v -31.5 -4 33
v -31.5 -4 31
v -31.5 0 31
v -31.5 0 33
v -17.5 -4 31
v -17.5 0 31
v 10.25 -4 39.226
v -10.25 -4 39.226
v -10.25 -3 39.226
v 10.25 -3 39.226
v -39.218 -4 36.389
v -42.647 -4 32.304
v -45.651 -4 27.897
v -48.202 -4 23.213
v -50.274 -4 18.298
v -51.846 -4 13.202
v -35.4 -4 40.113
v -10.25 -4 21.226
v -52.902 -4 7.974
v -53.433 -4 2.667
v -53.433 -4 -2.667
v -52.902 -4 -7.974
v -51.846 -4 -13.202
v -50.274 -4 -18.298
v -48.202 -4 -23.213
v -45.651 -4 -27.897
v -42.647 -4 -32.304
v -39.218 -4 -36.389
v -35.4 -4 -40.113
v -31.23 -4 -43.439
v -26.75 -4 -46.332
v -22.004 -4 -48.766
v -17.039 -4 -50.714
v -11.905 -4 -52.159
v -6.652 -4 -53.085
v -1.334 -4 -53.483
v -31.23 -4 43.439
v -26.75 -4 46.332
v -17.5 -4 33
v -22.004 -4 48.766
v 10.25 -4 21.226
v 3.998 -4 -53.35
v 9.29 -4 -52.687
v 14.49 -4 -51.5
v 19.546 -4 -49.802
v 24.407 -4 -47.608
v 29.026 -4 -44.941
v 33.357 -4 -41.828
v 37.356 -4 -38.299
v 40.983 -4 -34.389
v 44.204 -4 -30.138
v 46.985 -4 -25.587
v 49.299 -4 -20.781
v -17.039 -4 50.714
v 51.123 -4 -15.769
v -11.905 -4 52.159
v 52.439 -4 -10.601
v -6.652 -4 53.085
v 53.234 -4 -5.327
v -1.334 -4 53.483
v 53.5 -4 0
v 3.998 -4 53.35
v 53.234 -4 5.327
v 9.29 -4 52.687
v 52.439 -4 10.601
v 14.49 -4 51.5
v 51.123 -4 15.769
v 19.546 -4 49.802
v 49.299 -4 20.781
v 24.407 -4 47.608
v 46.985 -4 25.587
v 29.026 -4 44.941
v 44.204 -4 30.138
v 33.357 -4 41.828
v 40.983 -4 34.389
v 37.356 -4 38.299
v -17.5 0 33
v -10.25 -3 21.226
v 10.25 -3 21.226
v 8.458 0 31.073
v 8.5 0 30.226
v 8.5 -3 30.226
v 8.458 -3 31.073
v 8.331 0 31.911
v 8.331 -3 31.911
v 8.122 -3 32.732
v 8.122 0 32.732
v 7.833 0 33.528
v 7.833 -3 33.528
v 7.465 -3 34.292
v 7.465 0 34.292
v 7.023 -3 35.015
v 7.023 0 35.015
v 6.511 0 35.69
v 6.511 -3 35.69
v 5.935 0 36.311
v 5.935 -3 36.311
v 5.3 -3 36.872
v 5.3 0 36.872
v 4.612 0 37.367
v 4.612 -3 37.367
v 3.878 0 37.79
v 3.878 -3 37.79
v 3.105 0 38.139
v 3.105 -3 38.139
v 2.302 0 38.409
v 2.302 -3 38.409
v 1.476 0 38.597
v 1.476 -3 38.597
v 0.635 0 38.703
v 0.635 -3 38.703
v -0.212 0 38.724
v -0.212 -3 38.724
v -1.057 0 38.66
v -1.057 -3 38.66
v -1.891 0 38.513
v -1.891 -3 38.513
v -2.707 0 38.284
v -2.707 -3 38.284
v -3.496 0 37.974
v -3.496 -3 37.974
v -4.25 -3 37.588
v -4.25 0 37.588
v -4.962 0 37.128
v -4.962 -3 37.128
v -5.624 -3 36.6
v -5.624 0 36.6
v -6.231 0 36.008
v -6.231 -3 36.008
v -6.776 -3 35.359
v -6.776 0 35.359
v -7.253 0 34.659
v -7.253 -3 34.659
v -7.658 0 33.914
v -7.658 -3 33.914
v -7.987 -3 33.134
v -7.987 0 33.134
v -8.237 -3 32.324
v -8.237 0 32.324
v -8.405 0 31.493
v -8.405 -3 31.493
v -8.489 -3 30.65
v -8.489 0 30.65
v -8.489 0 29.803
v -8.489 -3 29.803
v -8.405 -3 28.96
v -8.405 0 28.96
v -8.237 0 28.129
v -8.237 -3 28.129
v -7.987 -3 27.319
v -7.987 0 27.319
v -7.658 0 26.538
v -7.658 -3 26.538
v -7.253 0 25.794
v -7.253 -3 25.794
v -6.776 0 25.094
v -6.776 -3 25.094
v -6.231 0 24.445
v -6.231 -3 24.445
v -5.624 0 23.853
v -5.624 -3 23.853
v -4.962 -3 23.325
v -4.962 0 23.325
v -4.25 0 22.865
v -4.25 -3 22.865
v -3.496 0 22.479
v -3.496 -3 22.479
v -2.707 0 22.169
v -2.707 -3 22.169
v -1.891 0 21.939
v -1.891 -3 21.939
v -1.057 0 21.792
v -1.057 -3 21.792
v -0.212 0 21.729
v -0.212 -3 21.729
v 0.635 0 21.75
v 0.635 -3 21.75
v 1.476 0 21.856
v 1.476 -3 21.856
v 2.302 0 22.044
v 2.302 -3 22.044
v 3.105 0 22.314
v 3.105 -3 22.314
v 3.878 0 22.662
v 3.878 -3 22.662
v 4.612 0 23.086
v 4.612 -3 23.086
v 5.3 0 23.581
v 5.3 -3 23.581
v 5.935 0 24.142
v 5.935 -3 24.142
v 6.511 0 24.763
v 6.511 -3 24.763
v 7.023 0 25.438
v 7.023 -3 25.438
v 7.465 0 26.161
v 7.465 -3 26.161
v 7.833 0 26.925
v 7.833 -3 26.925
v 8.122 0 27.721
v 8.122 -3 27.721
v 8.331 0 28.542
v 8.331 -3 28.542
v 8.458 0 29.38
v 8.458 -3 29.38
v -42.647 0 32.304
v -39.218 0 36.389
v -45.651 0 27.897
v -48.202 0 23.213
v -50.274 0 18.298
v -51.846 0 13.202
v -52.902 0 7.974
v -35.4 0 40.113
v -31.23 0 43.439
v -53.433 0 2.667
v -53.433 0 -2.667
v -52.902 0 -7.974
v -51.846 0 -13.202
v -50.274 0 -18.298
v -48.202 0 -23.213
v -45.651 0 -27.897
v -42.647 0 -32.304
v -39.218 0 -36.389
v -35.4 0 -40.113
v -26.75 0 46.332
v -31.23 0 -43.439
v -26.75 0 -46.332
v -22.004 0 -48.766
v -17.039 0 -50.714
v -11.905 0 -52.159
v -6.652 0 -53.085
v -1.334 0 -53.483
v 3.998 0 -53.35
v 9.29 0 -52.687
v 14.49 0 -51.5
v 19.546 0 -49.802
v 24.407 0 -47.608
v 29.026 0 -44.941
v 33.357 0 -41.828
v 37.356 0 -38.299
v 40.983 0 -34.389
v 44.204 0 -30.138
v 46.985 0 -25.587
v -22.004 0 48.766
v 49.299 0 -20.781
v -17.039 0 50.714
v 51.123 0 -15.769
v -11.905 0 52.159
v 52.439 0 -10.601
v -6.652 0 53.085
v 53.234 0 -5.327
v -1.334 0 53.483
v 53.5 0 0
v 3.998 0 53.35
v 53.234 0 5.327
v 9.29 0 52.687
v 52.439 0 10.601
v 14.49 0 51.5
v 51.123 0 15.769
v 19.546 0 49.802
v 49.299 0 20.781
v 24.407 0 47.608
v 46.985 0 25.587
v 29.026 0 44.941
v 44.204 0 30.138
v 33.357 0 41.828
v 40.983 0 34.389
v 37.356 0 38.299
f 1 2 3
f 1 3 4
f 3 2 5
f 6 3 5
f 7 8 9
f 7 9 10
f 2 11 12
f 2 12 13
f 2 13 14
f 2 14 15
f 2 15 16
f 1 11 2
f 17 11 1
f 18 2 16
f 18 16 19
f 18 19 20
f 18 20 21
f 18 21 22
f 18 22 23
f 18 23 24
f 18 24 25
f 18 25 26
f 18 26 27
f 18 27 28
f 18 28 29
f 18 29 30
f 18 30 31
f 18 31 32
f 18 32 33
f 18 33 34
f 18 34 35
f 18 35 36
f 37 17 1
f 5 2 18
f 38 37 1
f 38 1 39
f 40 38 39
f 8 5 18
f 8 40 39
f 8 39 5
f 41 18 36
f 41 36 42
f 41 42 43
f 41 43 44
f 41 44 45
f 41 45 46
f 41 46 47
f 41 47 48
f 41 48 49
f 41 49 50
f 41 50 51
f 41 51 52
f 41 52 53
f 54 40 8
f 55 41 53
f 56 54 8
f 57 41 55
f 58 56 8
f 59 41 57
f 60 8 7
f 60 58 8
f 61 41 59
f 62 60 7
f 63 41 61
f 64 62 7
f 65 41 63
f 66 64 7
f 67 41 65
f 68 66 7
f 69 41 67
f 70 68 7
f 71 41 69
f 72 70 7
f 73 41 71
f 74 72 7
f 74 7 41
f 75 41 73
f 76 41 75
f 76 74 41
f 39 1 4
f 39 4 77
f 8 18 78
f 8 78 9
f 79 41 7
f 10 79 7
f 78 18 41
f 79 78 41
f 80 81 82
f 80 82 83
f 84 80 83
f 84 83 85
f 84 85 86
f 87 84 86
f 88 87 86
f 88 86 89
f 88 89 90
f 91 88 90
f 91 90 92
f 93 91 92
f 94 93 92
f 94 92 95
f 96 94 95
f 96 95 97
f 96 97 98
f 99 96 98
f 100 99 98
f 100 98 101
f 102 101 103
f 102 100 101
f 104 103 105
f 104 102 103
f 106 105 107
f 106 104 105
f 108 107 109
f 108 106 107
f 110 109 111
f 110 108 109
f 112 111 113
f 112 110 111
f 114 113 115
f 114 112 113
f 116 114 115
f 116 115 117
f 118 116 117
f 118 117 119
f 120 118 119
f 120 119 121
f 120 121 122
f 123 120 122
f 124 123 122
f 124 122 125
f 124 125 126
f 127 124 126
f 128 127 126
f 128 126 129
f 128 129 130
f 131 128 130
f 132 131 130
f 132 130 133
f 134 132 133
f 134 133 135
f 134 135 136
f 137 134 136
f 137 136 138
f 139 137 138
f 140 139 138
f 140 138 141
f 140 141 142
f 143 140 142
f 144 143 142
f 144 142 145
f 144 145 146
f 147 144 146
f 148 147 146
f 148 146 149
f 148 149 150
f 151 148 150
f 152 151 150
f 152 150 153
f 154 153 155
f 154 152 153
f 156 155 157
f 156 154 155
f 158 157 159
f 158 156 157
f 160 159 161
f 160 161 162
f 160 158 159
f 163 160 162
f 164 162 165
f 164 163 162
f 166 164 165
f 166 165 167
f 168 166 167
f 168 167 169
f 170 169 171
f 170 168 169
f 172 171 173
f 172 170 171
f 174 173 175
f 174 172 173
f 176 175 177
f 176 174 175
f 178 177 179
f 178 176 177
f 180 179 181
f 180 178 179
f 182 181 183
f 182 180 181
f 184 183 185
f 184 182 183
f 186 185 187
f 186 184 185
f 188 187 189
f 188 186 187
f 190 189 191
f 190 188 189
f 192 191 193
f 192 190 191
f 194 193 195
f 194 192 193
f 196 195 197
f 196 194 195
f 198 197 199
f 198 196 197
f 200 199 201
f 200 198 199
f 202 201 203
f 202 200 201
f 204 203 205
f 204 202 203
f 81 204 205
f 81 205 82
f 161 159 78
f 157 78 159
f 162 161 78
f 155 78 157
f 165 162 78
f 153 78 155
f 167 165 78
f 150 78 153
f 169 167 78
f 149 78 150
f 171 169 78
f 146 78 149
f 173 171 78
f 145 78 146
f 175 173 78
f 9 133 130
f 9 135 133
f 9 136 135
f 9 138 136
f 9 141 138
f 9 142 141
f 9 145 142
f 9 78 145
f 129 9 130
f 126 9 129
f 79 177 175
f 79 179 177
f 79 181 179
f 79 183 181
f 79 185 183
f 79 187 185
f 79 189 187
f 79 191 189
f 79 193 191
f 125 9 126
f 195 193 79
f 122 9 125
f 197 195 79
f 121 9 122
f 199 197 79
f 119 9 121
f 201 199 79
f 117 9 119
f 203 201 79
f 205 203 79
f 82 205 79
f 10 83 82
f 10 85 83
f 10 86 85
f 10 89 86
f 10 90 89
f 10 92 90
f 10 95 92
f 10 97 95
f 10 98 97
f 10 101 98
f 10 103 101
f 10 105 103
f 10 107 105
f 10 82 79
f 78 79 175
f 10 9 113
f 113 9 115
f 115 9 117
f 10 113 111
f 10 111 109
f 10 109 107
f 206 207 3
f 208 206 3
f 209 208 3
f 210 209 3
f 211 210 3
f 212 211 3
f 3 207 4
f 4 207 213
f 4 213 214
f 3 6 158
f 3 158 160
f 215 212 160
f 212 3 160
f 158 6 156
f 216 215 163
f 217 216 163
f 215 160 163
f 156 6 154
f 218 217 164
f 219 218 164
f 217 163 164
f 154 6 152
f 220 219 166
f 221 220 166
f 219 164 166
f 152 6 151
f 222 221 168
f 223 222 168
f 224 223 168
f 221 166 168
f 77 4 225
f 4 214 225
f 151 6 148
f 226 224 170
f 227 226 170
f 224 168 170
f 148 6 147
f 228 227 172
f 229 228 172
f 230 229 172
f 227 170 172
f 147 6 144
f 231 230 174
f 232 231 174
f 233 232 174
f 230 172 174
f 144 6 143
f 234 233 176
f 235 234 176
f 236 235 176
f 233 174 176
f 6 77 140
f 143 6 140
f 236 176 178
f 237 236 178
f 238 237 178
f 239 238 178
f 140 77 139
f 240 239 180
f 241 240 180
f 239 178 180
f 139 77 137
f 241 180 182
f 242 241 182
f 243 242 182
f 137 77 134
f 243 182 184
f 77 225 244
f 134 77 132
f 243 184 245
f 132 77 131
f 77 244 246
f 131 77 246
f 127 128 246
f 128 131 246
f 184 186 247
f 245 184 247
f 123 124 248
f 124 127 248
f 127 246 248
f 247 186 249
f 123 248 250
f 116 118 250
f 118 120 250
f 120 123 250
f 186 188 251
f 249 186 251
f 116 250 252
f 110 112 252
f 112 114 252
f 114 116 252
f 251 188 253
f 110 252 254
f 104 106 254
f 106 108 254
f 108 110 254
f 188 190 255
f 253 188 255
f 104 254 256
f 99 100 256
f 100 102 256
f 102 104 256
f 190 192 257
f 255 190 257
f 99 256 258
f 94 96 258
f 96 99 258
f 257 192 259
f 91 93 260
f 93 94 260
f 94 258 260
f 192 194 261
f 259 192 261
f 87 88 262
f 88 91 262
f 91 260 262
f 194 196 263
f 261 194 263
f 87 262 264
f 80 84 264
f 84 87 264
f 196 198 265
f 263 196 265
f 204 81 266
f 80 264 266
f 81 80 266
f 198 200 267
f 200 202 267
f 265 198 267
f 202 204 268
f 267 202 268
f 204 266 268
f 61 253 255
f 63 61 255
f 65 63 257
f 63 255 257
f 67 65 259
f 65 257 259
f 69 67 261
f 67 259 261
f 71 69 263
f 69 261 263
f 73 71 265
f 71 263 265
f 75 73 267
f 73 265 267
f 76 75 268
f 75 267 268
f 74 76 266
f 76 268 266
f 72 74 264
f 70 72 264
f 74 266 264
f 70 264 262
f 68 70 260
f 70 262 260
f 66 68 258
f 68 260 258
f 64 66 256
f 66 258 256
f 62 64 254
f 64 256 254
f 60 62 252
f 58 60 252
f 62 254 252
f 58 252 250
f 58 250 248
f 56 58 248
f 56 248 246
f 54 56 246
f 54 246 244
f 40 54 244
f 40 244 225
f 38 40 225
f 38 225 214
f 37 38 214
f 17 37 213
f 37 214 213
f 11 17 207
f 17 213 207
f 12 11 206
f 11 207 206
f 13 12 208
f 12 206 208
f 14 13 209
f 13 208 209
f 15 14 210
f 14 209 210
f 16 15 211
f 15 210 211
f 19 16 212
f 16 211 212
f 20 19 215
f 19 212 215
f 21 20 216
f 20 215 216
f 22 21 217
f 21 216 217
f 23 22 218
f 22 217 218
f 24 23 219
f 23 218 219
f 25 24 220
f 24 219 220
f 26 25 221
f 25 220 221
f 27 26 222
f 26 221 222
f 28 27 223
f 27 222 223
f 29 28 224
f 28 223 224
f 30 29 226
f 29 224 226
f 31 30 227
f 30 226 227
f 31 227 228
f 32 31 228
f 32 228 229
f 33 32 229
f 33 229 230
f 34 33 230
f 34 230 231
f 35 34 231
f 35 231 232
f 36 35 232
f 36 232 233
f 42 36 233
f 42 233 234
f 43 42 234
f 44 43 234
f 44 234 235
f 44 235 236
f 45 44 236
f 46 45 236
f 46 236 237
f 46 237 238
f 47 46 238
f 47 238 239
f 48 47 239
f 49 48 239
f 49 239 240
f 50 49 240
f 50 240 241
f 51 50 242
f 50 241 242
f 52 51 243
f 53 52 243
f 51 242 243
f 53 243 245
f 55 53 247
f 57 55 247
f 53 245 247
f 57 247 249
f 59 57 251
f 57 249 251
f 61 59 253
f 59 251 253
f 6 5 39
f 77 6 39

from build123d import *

# Parameters (mm, degrees)
F0_R     = 53.5
F0_R_2   = 8.5
F1_DEPTH = 4
F2_W     = 20.5
F2_H     = 18
F2_R     = 8.5
F3_DEPTH = 1
F4_W     = 14
F4_H     = 2
F5_DEPTH = 25


# Not quite as in the source:
# - a feature names something its author has since deleted; it is built from what else it names


with BuildPart() as f1:
    # F0 (on Front) → F1 (new body)
    with BuildSketch(Plane.XZ):
        Circle(F0_R)
        with Locations((0, 30.2263684571)):
            Circle(F0_R_2, mode=Mode.SUBTRACT)
    extrude(amount=F1_DEPTH)

    # F2 (on face) → F3 (cut)
    with BuildSketch(Plane.XZ.offset(4)):
        with Locations((0, 30.2263684571)):
            Rectangle(F2_W, F2_H)
        with Locations((0, 30.2263684571)):
            Circle(F2_R, mode=Mode.SUBTRACT)
    extrude(amount=-F3_DEPTH, mode=Mode.SUBTRACT)

    # F4 (on face) → F5 (cut)
    with BuildSketch(Plane.XZ.offset(4)):
        with Locations((-24.5, 32)):
            Rectangle(F4_W, F4_H)
    extrude(amount=-F5_DEPTH, mode=Mode.SUBTRACT)


solid = f1.part
